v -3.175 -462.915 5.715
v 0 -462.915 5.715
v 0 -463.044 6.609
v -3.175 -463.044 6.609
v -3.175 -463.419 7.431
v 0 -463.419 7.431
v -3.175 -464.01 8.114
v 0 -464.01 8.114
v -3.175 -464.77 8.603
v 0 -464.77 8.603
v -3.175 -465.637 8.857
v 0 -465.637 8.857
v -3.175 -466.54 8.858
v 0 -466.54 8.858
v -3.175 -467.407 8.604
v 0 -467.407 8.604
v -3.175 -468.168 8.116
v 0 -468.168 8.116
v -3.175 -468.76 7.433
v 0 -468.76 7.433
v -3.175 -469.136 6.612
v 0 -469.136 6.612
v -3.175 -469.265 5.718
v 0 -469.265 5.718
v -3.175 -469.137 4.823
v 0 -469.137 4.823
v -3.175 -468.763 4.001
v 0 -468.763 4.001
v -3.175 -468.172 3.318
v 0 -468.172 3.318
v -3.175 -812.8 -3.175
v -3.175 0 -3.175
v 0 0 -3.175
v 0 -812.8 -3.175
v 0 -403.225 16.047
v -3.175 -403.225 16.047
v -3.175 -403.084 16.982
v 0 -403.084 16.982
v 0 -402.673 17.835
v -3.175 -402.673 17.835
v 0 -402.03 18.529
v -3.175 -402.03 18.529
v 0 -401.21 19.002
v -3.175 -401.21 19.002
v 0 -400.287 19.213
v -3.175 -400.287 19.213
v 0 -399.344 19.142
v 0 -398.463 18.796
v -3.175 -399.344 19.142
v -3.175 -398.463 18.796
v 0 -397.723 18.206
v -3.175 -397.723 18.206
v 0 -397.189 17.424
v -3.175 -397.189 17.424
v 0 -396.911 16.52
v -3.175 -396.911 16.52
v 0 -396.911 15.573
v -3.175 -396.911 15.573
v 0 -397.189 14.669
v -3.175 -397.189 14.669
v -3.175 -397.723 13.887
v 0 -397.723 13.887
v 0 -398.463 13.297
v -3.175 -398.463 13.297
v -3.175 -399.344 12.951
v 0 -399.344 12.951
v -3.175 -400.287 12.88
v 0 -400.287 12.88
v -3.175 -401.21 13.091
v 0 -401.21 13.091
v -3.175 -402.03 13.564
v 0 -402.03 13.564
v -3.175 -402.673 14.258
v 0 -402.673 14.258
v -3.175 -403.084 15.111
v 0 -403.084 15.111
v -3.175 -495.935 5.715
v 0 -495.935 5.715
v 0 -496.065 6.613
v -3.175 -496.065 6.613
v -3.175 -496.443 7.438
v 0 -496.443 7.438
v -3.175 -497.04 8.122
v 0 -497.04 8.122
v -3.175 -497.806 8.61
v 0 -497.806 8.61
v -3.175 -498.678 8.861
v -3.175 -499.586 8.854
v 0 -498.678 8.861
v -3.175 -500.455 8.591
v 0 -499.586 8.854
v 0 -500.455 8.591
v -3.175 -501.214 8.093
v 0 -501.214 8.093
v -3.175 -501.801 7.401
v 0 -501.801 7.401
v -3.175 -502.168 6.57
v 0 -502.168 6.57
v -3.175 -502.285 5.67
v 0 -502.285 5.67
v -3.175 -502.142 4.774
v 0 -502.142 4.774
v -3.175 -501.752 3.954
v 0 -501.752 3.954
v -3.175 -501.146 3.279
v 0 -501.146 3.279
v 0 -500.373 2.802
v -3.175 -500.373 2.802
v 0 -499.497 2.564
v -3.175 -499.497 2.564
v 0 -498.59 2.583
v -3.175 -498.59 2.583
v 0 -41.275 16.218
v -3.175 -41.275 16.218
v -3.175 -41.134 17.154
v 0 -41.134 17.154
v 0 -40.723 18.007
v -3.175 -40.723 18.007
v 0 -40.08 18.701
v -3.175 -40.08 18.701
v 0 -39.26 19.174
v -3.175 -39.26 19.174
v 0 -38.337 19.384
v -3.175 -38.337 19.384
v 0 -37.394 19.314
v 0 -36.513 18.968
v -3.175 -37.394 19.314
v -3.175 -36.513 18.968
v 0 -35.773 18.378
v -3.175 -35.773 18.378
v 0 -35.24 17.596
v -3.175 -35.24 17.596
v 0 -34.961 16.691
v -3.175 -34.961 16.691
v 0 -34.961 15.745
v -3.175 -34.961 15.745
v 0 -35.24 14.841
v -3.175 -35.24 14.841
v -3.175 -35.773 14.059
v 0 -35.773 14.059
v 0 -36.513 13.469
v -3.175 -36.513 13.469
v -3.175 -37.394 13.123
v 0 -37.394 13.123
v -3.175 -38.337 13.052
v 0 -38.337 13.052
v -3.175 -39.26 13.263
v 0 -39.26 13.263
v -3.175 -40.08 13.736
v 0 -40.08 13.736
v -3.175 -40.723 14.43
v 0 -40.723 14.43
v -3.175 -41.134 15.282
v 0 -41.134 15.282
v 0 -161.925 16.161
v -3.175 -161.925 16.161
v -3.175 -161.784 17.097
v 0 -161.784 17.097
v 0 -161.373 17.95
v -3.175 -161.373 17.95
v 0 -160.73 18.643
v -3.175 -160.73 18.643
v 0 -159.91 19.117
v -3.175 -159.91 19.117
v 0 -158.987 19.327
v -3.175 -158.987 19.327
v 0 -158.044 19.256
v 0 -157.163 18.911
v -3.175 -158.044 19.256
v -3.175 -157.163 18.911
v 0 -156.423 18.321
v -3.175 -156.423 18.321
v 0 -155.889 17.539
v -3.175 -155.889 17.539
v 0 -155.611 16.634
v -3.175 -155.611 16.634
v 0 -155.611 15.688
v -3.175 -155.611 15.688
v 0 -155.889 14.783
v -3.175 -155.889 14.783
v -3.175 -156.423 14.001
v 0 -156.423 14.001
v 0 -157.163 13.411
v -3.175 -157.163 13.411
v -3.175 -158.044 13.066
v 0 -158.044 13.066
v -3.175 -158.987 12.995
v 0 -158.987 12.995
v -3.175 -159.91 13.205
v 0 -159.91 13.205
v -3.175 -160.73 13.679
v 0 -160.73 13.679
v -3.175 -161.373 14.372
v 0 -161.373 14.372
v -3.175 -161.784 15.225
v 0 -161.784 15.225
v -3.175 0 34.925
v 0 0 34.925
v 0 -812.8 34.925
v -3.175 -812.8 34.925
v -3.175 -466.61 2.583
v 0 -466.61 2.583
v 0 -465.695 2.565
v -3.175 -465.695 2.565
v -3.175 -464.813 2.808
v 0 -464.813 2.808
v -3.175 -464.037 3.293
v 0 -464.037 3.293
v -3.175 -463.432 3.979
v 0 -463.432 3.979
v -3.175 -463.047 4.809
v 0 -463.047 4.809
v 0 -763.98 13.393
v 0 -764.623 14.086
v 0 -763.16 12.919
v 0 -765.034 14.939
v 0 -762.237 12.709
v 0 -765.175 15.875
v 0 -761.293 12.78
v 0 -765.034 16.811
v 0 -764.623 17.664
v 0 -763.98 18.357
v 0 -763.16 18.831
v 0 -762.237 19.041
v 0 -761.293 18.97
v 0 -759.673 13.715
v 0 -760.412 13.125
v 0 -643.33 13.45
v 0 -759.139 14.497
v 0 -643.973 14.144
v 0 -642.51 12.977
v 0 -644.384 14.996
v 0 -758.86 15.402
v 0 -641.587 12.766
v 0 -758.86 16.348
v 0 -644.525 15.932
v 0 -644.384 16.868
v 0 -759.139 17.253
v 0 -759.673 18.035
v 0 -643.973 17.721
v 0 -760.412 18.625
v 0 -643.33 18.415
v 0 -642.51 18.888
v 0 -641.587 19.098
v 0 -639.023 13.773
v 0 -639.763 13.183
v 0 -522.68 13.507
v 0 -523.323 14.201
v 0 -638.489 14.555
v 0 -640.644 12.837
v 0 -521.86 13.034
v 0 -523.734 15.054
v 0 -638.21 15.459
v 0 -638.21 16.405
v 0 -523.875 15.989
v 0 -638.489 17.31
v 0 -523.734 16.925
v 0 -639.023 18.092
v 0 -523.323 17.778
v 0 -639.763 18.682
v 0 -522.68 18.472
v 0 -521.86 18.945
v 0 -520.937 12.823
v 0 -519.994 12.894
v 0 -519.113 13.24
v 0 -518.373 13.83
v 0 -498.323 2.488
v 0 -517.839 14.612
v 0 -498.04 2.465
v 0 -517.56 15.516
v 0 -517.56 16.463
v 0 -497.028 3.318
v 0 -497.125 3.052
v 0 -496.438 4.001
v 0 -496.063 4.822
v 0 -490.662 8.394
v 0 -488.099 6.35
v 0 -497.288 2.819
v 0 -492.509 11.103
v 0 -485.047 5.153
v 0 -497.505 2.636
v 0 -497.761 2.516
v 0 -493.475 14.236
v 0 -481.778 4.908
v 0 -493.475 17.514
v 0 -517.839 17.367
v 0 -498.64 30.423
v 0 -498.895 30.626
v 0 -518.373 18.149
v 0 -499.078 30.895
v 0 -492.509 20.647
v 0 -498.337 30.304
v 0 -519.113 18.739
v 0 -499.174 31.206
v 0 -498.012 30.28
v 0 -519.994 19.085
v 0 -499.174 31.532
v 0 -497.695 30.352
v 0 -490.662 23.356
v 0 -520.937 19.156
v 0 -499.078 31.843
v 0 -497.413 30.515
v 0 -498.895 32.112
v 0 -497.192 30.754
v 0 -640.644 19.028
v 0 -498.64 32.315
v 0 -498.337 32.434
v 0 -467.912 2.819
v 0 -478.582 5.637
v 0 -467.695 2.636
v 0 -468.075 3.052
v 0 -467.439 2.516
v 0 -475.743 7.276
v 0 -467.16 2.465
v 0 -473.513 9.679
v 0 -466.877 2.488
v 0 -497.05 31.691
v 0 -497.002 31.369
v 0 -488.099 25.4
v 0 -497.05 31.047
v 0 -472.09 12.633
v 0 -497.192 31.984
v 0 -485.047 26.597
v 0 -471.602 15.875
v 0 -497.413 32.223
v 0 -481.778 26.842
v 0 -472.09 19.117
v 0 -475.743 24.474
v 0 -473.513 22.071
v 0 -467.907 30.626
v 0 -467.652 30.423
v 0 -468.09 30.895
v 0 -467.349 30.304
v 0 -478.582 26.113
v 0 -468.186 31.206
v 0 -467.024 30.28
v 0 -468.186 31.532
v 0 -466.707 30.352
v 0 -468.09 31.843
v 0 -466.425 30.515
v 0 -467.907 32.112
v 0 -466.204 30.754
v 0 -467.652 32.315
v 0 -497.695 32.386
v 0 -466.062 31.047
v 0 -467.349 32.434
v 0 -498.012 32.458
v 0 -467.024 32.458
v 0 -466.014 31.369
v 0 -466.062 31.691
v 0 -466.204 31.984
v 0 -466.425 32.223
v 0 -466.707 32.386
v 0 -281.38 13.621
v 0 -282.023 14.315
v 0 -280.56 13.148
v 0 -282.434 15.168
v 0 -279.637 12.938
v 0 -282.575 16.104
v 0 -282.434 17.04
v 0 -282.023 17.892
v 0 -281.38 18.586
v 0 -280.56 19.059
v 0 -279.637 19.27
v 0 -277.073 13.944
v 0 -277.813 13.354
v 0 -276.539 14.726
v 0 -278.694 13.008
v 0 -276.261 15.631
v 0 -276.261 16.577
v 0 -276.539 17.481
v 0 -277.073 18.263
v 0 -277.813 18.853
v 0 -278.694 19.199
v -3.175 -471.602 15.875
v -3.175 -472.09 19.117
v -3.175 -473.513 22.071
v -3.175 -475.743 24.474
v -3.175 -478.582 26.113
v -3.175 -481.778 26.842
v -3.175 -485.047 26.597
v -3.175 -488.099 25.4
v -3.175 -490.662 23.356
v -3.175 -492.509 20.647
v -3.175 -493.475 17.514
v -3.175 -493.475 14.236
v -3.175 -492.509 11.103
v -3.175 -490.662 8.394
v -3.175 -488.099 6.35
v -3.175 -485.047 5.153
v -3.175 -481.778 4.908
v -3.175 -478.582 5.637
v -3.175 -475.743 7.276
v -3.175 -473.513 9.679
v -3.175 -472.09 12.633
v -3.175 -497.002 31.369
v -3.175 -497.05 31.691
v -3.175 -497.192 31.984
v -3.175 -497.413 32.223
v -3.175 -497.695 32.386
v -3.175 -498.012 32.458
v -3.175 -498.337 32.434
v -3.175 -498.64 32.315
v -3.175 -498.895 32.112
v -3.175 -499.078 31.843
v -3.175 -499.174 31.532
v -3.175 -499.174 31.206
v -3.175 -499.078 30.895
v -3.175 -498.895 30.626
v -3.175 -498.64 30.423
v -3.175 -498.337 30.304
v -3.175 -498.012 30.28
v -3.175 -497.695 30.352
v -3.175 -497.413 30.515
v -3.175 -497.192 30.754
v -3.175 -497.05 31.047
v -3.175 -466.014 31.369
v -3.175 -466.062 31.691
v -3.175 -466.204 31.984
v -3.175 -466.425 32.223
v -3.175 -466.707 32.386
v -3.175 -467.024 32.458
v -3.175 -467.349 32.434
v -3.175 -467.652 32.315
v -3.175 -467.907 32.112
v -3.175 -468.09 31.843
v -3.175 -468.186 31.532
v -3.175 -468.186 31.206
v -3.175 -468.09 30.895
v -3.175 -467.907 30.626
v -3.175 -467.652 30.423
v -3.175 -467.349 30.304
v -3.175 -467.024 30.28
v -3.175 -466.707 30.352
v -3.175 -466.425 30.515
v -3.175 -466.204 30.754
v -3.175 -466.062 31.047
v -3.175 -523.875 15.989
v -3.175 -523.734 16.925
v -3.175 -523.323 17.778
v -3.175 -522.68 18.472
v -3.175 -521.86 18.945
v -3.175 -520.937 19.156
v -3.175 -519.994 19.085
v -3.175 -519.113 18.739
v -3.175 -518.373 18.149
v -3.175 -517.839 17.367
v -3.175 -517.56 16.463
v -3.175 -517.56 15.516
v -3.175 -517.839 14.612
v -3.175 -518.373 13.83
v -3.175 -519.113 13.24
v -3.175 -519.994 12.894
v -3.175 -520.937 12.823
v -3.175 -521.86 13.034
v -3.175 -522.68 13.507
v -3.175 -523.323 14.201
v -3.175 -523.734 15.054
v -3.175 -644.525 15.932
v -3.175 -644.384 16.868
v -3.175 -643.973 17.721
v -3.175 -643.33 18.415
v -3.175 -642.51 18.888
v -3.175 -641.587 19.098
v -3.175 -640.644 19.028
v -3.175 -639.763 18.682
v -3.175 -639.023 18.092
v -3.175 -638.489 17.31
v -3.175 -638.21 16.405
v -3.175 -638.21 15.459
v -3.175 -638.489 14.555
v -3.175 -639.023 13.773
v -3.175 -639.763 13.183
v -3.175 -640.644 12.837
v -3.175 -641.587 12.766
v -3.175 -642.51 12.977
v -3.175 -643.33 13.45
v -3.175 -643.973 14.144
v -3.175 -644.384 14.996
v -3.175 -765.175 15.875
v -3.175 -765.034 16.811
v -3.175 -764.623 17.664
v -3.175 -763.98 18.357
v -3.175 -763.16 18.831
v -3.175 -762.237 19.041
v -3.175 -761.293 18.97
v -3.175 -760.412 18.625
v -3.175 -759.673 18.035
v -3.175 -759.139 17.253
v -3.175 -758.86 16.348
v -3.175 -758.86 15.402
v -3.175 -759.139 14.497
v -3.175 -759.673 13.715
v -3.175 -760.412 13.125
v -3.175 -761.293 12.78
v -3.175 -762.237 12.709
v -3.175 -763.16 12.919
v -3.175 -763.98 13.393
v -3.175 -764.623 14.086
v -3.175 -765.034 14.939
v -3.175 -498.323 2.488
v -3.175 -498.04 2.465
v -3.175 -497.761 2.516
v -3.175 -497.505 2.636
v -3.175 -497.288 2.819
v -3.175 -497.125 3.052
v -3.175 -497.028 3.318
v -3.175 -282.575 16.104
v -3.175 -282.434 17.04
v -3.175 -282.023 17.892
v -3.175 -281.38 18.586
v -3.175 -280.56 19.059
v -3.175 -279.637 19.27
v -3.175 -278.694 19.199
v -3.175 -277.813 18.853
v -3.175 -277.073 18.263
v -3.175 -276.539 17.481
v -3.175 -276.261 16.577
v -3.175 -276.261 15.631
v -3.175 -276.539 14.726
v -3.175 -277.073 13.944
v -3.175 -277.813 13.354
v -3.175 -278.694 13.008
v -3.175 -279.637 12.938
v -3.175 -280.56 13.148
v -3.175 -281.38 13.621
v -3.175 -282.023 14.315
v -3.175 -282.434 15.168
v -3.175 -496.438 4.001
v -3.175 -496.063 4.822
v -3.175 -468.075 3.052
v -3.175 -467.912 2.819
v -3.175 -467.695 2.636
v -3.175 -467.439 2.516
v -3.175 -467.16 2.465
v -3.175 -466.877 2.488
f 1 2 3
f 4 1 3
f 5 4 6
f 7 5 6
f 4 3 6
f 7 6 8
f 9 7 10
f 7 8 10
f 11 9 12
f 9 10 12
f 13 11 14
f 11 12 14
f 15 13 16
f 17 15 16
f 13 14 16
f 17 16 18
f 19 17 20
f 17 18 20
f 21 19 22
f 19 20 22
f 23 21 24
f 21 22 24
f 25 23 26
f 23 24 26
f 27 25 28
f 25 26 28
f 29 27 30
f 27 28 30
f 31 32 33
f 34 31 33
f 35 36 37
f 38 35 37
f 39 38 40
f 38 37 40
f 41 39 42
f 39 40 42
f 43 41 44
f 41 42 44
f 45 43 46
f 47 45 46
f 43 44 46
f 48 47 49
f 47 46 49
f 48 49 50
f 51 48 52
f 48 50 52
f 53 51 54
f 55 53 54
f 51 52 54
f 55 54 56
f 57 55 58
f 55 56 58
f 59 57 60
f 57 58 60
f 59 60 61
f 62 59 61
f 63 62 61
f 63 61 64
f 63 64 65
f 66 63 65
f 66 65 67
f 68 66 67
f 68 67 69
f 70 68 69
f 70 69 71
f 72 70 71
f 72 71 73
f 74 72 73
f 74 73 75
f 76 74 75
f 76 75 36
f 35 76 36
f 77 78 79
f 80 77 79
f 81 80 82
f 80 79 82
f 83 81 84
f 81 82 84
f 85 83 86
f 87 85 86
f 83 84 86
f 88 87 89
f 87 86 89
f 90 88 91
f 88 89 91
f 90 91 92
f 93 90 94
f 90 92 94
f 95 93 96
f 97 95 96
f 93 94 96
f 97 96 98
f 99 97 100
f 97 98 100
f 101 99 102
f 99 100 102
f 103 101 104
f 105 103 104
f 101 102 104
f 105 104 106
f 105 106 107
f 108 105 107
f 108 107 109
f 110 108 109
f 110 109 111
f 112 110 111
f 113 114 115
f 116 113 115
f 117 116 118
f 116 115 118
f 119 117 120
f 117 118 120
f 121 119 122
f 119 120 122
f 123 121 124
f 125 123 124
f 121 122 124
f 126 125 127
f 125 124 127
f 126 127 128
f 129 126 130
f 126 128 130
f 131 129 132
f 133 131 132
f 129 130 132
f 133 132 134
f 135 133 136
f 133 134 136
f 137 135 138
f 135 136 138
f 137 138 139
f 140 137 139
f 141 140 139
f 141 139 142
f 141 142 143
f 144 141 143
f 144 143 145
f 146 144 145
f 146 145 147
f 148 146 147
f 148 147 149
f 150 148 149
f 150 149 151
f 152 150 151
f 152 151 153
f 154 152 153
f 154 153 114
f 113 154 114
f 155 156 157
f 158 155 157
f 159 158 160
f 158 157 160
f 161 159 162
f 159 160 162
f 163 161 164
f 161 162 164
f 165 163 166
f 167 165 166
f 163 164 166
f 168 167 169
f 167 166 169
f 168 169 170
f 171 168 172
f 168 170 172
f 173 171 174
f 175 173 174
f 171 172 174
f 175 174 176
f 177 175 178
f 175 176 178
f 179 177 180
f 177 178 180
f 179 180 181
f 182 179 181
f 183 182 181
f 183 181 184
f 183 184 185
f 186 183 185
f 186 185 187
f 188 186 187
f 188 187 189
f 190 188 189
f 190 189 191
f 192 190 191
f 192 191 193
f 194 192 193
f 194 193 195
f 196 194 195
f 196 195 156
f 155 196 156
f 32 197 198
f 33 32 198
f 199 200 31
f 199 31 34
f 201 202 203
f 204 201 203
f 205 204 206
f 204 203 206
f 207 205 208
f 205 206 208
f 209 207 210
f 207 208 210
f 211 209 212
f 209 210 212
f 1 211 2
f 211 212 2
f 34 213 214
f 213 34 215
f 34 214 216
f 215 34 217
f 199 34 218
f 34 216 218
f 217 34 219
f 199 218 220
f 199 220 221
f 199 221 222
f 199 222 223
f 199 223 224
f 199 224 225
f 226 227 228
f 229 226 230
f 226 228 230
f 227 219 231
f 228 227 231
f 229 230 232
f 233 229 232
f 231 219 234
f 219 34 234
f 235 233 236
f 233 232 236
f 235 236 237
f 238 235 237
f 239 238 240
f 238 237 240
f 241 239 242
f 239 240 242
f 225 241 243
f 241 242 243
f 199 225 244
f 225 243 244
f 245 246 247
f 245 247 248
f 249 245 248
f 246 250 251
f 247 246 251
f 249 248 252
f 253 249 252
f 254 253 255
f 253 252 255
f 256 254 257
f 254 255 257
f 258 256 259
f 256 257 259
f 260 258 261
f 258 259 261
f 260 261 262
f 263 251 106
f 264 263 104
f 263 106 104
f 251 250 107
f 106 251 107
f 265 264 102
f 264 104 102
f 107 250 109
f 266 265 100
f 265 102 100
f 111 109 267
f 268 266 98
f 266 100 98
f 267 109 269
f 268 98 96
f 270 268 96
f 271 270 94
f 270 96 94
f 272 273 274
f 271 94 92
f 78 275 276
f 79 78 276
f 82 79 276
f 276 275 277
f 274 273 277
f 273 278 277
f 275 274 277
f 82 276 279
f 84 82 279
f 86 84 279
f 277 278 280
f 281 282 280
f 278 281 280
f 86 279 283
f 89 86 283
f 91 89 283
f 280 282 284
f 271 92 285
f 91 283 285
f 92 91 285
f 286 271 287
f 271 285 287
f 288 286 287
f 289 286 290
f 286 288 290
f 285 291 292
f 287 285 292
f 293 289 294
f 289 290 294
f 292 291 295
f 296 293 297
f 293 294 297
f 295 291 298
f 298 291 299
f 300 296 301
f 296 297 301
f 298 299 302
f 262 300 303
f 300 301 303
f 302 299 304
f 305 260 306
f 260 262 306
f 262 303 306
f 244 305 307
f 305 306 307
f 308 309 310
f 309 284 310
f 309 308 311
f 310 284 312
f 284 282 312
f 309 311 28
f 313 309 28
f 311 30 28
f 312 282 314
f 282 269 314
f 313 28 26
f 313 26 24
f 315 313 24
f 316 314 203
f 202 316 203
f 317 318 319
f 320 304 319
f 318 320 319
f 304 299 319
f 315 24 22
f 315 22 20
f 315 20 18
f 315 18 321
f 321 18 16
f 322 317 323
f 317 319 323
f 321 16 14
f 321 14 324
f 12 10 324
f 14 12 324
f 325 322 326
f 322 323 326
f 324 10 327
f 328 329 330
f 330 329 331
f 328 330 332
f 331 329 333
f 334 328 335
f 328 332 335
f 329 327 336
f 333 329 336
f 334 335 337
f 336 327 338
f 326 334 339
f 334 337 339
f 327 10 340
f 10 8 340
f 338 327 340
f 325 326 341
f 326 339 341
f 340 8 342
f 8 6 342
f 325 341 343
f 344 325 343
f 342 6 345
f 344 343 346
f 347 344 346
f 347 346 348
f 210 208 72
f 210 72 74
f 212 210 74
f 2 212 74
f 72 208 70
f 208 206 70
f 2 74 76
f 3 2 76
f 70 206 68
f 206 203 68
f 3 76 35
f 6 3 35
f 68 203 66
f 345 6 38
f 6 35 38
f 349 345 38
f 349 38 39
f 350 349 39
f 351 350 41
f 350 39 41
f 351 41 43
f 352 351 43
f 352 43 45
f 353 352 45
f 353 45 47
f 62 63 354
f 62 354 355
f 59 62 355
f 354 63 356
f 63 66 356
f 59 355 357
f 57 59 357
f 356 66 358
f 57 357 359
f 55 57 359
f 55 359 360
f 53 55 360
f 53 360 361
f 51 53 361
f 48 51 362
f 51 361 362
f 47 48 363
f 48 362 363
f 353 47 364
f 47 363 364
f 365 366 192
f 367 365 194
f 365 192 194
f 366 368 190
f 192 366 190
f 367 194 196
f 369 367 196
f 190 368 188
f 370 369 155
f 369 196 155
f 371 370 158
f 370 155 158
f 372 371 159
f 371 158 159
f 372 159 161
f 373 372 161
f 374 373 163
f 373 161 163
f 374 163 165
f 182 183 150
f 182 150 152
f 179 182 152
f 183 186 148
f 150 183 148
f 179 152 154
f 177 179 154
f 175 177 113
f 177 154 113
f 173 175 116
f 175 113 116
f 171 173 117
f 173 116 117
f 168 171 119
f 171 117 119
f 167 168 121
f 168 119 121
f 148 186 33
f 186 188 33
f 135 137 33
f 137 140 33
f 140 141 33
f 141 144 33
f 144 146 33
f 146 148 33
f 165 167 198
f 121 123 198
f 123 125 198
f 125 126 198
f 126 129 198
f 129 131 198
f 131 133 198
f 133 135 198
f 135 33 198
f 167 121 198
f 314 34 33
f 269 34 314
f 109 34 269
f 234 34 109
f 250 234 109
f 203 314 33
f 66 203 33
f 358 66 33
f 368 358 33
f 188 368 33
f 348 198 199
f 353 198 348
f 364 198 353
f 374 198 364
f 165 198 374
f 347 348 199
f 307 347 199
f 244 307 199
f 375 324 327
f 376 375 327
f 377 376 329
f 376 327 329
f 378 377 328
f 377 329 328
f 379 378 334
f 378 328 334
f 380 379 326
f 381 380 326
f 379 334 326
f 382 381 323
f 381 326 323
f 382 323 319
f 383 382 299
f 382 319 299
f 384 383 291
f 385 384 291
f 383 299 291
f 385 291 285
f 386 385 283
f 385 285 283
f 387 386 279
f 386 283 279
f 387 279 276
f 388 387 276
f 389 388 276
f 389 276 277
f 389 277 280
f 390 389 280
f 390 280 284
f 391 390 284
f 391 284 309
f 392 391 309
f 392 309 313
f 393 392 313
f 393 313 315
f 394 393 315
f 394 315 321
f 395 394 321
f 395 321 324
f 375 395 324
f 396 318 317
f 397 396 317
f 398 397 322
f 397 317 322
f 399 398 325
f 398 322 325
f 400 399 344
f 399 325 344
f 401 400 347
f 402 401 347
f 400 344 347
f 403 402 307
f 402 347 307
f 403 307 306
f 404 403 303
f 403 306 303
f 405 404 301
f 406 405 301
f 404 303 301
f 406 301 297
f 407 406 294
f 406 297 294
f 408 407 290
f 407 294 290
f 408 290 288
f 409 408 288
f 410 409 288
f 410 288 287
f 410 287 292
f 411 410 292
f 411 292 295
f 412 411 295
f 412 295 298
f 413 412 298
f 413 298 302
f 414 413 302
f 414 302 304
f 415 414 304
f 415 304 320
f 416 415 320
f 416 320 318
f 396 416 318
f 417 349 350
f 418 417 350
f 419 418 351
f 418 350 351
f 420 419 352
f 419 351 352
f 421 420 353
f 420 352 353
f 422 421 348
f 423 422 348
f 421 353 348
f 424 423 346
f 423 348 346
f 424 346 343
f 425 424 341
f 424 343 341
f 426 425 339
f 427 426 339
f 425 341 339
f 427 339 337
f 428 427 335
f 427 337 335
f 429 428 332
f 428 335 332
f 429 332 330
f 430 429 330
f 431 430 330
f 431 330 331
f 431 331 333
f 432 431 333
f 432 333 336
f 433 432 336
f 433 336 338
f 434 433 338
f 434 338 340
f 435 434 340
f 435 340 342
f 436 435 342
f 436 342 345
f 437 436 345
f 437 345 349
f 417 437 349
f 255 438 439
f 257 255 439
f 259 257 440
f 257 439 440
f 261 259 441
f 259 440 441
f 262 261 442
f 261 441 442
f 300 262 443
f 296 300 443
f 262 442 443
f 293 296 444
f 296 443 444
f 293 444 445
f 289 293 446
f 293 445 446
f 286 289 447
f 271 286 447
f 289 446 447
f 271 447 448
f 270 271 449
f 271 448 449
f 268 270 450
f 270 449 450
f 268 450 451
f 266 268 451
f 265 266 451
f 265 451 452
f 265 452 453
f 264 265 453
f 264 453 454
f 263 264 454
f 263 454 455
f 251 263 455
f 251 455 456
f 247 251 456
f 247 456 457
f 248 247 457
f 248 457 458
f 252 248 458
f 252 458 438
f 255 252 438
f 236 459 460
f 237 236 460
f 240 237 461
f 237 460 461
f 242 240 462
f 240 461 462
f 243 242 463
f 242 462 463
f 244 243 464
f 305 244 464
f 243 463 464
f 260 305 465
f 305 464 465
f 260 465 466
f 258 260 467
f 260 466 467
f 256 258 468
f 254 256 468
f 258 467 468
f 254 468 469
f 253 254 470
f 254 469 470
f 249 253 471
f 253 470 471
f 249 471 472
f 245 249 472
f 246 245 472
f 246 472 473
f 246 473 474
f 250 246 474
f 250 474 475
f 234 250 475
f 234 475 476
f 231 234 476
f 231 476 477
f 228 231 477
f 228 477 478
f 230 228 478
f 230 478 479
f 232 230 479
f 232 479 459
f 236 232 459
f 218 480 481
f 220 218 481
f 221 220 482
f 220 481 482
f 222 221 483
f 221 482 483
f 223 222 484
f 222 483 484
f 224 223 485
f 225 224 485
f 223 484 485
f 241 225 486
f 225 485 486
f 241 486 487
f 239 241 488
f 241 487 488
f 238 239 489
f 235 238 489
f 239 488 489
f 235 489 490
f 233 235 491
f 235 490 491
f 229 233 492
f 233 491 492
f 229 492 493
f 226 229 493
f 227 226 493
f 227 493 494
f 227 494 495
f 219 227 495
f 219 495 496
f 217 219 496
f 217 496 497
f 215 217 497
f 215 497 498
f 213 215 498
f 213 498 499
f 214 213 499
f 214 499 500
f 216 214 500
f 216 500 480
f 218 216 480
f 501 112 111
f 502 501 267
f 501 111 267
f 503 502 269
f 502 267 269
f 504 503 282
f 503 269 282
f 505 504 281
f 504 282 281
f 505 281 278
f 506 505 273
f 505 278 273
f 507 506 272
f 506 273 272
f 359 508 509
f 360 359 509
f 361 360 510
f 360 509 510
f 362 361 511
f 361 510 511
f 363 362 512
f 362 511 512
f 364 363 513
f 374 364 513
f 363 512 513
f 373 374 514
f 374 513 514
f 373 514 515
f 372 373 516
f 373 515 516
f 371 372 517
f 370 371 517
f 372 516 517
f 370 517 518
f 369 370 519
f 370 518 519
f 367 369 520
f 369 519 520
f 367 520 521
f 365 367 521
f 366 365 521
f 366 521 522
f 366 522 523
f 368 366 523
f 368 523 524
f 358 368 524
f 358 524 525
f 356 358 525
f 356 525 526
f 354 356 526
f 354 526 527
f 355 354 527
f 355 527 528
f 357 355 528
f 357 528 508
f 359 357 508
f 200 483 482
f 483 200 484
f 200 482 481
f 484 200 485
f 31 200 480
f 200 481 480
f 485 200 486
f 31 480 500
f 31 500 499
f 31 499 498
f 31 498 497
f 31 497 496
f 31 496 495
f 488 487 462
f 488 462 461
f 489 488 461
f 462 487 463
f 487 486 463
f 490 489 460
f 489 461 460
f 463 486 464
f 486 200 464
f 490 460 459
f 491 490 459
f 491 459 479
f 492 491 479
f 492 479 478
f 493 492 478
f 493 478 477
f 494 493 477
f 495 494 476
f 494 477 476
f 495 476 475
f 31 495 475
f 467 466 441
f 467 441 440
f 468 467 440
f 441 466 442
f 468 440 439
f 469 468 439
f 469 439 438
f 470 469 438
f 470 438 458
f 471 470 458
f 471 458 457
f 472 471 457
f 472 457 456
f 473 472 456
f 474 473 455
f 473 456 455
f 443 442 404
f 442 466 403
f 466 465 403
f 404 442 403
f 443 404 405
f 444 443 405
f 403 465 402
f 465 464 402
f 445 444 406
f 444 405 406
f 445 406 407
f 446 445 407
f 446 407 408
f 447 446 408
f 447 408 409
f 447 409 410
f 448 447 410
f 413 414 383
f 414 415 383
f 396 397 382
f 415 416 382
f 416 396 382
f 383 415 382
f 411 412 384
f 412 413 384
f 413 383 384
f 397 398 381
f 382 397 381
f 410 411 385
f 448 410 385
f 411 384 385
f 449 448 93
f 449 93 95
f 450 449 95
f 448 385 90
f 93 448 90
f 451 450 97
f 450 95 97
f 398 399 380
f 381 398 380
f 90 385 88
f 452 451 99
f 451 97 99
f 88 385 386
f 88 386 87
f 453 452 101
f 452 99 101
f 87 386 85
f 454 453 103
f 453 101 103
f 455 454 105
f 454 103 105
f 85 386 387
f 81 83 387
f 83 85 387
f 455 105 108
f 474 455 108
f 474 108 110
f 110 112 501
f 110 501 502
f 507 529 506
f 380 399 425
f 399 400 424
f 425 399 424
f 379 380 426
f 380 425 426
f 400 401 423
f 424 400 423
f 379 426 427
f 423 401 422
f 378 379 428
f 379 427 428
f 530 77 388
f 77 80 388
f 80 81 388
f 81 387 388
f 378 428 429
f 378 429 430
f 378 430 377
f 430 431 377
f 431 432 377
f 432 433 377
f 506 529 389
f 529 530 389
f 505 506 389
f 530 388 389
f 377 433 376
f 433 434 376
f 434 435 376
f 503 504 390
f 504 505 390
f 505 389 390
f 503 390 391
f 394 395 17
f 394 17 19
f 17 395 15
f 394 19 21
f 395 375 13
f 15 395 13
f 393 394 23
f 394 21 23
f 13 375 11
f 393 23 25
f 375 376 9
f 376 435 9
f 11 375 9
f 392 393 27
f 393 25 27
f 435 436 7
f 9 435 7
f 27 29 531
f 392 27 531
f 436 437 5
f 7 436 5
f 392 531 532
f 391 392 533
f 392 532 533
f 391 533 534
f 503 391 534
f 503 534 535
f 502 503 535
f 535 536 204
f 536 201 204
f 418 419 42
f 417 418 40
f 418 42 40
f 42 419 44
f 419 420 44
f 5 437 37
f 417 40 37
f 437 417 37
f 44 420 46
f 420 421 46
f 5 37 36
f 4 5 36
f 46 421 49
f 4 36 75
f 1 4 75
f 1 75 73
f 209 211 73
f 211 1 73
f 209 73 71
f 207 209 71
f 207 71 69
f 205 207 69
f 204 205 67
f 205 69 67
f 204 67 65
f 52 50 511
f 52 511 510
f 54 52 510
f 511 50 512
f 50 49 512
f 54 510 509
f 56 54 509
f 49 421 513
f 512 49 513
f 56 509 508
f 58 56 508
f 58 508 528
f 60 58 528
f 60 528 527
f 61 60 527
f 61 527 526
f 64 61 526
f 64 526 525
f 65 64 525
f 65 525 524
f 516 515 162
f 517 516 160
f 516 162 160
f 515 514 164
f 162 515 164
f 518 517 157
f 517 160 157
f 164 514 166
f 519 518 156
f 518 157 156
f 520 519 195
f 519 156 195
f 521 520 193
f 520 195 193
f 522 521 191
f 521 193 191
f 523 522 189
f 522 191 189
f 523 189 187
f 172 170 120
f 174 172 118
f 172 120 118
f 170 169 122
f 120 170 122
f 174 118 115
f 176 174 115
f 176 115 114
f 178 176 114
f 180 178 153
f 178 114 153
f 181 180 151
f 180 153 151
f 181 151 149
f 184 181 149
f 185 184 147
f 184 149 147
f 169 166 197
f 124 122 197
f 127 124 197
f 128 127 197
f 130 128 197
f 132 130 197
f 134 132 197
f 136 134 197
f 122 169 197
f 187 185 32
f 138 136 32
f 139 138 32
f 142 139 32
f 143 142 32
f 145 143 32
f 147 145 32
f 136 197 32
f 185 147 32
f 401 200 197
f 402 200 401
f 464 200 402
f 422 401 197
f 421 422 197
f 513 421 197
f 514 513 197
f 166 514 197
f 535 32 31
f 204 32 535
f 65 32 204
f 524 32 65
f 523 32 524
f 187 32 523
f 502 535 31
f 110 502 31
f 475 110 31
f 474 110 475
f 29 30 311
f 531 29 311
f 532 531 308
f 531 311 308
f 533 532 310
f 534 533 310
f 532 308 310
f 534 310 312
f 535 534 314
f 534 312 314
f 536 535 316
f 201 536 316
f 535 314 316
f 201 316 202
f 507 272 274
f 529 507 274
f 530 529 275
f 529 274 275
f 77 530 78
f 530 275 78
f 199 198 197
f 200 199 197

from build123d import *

# Parameters (mm, degrees)
F1_DEPTH = 812.8
F2_R     = 10.9982
F2_R_2   = 1.0922
F3_DEPTH = 25.4
F4_R     = 3.175
F5_DEPTH = 25.4


with BuildPart() as f1:
    # F0 (on Front) → F1 (new body)
    with BuildSketch(Plane.XZ):
        Polygon((0, -3.175), (0, 0), (0, 34.925), (-3.175, 34.925), (-3.175, -3.175), align=None)
    extrude(amount=F1_DEPTH)

    # F2 (on face) → F3 (cut)
    with BuildSketch(Plane.YZ):
        with Locations((-482.6, 15.875)):
            Circle(F2_R)
        with BuildLine():
            ThreePointArc((-497.0280745814, 3.3178743146), (-496.2211647499, 4.3977088788), (-495.935, 5.715))
            ThreePointArc((-495.935, 5.715), (-501.5319671306, 7.7679735064), (-498.5899292713, 2.5828838723))
            ThreePointArc((-498.5899292713, 2.5828838723), (-498.664634248, 4.4872772922), (-497.0018, 3.556))
            ThreePointArc((-497.0018, 3.556), (-497.0083885174, 3.4362145714), (-497.0280745814, 3.3178743146))
        make_face()
        with BuildLine():
            ThreePointArc((-497.0018, 3.556), (-498.664634248, 4.4872772922), (-498.5899292713, 2.5828838723))
            ThreePointArc((-498.5899292713, 2.5828838723), (-497.7580944097, 2.8422006205), (-497.0280745814, 3.3178743146))
            ThreePointArc((-497.0280745814, 3.3178743146), (-497.0083885174, 3.4362145714), (-497.0018, 3.556))
        make_face()
        with BuildLine():
            ThreePointArc((-497.0280745814, 3.3178743146), (-497.7580944097, 2.8422006205), (-498.5899292713, 2.5828838723))
            ThreePointArc((-498.5899292713, 2.5828838723), (-497.6289444769, 2.5677570135), (-497.0280745814, 3.3178743146))
        make_face()
        with BuildLine():
            ThreePointArc((-466.6100707287, 2.5828838723), (-464.0370264936, 3.2930328694), (-462.915, 5.715))
            ThreePointArc((-462.915, 5.715), (-467.4072911212, 8.6038352501), (-468.1719254186, 3.3178743146))
            ThreePointArc((-468.1719254186, 3.3178743146), (-467.2257854286, 4.6416114826), (-466.0138, 3.556))
            ThreePointArc((-466.0138, 3.556), (-466.1747227078, 2.985365752), (-466.6100707287, 2.5828838723))
        make_face()
        with BuildLine():
            ThreePointArc((-466.0138, 3.556), (-467.2257854286, 4.6416114826), (-468.1719254186, 3.3178743146))
            ThreePointArc((-468.1719254186, 3.3178743146), (-467.4419055903, 2.8422006205), (-466.6100707287, 2.5828838723))
            ThreePointArc((-466.6100707287, 2.5828838723), (-466.1747227078, 2.985365752), (-466.0138, 3.556))
        make_face()
        with BuildLine():
            ThreePointArc((-466.6100707287, 2.5828838723), (-467.4419055903, 2.8422006205), (-468.1719254186, 3.3178743146))
            ThreePointArc((-468.1719254186, 3.3178743146), (-467.5710555231, 2.5677570135), (-466.6100707287, 2.5828838723))
        make_face()
        with Locations((-498.094, 31.369)):
            Circle(F2_R_2)
        with Locations((-467.106, 31.369)):
            Circle(F2_R_2)
    extrude(amount=-F3_DEPTH, mode=Mode.SUBTRACT)

    # F4 (on face) → F5 (cut)
    with BuildSketch(Plane(origin=(-3.175, 0, 0), x_dir=(0, -1, 0), z_dir=(-1, 0, 0))):
        with Locations((762, 15.875)):
            Circle(F4_R)
        with Locations((641.3500135583, 15.9321981283)):
            Circle(F4_R)
        with Locations((520.7000271167, 15.9893962565)):
            Circle(F4_R)
        with Locations((400.050040675, 16.0465943848)):
            Circle(F4_R)
        with Locations((279.4000542333, 16.103792513)):
            Circle(F4_R)
        with Locations((158.7500677917, 16.1609906413)):
            Circle(F4_R)
        with Locations((38.10008135, 16.2181887695)):
            Circle(F4_R)
    extrude(amount=-F5_DEPTH, mode=Mode.SUBTRACT)


solid = f1.part
